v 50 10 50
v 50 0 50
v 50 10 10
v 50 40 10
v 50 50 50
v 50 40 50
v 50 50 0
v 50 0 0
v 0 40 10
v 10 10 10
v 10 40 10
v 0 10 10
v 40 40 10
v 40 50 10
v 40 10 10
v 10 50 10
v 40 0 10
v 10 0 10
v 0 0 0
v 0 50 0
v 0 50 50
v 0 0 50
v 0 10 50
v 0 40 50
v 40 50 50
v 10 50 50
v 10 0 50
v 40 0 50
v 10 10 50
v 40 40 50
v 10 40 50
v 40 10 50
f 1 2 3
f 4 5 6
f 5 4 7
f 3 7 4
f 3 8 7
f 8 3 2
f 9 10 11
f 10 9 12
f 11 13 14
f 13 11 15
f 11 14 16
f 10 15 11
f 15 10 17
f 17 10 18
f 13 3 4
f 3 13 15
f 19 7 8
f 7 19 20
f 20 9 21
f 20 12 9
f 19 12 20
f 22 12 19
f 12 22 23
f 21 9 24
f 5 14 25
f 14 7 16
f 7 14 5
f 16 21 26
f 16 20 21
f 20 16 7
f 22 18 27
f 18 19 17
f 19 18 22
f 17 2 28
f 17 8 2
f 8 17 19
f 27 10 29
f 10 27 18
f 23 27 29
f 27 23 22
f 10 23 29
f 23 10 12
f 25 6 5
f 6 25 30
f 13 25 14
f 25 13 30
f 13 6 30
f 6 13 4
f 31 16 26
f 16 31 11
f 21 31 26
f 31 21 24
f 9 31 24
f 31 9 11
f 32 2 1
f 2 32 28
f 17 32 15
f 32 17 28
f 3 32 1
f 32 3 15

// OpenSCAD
first_layer_height = 0.24;
layer_height = 0.08;

edge = 50;
pillars= 10;

cube(
    [edge,
    edge,
    pillars,
    ],
    center=false);
    
    
cube(
    [pillars,
    pillars,
    edge,
    ],
    center=false);
    
translate( v = [edge - pillars, edge - pillars, 0] ) {
    cube(
    [pillars,
    pillars,
    edge,
    ],
    center=false);
}

translate( v = [0, edge - pillars, 0] ) {
    cube(
    [pillars,
    pillars,
    edge,
    ],
    center=false);
}

translate( v = [edge - pillars, 0, 0] ) {
    cube(
    [pillars,
    pillars,
    edge,
    ],
    center=false);
}
